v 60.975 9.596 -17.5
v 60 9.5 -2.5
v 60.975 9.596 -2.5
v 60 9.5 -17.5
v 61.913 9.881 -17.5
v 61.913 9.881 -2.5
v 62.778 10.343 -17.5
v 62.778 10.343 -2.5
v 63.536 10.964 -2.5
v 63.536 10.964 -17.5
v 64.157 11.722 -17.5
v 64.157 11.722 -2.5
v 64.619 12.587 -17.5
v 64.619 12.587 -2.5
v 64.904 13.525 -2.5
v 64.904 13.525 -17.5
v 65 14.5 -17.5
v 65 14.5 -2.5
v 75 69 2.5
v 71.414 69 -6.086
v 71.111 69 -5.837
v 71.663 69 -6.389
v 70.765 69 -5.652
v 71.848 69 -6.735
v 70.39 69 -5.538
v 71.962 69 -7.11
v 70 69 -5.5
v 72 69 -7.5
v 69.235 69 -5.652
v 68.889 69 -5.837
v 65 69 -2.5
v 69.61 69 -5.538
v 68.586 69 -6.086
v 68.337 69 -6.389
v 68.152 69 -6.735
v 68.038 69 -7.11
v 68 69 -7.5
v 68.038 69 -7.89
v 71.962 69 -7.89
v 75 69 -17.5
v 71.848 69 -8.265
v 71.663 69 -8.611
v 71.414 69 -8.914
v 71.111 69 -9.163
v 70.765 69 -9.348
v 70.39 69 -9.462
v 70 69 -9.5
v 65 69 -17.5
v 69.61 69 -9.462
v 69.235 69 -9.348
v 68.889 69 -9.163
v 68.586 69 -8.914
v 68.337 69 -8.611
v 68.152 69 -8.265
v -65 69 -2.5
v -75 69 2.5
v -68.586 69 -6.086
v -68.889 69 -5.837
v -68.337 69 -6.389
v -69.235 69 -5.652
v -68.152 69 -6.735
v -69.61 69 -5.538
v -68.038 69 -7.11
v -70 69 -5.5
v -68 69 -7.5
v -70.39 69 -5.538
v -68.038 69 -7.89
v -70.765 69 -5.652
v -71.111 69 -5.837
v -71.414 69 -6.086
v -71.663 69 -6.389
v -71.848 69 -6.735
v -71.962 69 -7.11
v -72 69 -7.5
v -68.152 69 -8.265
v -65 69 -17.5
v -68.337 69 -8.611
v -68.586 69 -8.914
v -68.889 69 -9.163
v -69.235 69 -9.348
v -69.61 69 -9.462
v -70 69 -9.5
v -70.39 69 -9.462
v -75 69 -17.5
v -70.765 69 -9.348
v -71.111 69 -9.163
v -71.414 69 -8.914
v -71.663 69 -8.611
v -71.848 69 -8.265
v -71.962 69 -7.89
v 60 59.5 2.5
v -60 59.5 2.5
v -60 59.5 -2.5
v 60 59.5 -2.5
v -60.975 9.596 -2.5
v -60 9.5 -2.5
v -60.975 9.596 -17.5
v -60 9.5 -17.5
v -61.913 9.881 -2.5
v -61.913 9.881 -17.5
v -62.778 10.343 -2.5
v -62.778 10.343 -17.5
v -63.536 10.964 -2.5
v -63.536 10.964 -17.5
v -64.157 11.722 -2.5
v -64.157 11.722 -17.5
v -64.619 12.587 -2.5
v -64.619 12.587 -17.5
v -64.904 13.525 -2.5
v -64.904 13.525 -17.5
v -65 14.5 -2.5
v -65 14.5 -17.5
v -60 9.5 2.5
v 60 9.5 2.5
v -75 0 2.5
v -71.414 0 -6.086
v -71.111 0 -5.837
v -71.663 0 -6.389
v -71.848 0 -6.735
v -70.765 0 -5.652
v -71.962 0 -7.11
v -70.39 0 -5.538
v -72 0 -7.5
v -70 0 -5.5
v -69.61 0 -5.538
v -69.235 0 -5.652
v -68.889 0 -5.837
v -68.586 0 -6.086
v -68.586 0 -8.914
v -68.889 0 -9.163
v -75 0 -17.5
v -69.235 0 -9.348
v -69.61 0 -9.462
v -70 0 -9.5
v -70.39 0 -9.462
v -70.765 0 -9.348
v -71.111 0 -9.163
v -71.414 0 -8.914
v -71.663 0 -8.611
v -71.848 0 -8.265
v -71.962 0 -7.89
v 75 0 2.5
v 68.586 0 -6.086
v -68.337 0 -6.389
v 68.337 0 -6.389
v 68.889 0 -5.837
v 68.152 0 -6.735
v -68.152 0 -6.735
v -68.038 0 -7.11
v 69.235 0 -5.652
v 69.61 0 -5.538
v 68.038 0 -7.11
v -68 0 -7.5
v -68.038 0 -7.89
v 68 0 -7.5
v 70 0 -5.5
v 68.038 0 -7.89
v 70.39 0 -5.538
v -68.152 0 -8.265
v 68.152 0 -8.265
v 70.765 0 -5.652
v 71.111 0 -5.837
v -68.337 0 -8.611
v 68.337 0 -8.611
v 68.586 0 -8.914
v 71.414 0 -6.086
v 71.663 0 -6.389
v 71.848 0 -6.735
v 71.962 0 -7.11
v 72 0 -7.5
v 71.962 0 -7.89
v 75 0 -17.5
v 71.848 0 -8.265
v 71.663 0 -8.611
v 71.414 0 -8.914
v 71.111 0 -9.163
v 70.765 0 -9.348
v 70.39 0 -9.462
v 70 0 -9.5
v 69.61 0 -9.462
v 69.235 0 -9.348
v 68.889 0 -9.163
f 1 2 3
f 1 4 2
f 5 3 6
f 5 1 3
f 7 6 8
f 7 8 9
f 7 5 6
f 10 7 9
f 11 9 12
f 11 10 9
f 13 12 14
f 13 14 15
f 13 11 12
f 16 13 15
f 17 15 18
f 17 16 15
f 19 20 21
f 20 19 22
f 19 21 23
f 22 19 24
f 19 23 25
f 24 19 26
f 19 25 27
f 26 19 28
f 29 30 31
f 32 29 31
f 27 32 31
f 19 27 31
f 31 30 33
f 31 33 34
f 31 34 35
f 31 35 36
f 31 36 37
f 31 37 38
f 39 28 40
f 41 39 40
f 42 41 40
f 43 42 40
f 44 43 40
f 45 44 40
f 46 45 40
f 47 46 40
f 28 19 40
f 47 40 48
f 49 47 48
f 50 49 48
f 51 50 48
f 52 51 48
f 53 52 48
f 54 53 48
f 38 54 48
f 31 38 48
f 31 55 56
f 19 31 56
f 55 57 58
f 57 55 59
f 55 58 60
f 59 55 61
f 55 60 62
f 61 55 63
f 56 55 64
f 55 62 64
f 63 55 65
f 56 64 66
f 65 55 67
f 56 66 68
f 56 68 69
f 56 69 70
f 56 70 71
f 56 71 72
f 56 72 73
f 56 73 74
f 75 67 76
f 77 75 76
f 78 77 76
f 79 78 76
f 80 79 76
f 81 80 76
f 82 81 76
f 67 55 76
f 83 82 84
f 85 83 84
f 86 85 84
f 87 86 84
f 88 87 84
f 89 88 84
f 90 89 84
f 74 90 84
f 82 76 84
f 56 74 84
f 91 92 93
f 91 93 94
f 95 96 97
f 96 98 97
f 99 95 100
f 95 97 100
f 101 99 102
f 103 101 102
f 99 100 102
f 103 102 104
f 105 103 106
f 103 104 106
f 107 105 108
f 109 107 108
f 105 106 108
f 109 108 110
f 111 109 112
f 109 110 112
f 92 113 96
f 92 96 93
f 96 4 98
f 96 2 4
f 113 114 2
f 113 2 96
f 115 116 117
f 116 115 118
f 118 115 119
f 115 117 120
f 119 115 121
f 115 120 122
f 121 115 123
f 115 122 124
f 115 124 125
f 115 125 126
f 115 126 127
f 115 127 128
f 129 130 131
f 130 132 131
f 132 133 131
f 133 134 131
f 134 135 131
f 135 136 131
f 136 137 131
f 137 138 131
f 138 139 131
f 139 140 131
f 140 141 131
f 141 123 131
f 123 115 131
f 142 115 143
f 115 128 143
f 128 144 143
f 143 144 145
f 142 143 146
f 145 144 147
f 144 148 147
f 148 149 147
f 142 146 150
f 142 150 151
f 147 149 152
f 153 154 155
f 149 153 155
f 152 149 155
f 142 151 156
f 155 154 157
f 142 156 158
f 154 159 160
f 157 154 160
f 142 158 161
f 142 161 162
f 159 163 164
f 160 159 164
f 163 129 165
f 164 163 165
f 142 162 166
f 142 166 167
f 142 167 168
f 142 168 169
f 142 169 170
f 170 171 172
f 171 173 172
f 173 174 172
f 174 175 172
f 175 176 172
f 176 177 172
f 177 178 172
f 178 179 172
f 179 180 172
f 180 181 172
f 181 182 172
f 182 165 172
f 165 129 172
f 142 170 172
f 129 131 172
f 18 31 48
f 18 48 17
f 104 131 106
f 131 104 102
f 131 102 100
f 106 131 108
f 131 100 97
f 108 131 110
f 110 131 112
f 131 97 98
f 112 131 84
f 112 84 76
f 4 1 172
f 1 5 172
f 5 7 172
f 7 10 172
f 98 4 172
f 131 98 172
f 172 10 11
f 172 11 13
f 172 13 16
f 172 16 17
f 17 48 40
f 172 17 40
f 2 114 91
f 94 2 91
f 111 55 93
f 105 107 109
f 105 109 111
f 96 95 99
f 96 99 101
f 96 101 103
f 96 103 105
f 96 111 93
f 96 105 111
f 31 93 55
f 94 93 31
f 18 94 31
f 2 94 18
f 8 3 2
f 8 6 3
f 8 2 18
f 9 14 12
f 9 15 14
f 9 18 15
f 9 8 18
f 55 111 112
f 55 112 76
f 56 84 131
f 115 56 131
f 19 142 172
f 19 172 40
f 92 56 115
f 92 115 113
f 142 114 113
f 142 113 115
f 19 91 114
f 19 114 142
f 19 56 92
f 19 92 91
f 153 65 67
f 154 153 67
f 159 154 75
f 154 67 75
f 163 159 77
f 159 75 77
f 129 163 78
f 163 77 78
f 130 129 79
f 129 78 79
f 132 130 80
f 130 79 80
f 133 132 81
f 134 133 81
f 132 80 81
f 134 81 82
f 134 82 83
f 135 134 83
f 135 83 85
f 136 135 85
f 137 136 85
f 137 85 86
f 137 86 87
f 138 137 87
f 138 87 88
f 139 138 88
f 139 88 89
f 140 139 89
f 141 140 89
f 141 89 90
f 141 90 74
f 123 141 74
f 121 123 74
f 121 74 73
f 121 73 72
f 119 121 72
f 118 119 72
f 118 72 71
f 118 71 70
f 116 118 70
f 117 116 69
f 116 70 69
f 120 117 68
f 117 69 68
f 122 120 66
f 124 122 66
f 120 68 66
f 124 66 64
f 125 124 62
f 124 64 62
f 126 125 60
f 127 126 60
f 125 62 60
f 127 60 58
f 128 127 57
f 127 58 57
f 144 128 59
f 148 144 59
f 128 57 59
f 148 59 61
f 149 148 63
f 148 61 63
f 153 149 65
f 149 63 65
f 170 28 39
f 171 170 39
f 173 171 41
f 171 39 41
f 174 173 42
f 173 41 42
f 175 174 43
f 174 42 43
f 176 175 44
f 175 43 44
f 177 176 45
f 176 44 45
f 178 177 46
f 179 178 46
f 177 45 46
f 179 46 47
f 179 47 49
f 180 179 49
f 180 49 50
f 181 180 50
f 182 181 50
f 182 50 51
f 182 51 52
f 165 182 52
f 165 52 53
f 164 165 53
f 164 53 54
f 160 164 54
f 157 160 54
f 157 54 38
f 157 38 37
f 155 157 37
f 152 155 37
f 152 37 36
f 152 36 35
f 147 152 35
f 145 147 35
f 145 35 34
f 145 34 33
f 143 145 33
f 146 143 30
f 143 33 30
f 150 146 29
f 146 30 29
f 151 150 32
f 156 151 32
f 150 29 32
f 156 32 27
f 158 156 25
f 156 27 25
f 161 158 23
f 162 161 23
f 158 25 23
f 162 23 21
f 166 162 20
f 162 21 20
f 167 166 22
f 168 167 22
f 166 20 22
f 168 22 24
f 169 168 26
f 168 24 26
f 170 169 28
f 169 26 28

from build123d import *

# Parameters (mm, degrees)
SKETCH1_W                = 130
SKETCH1_H                = 5
BOSS_EXTRUDE1_DEPTH      = 69
SKETCH2_W                = 120
SKETCH2_H                = 50
CUT_EXTRUDE1_DEPTH       = 65
BOSS_EXTRUDE3_DEPTH      = 15
BOSS_EXTRUDE3_DEPTH_BACK = 5
SKETCH4_R                = 2
CUT_EXTRUDE2_DEPTH       = 70
FILLET1_R                = 5


with BuildPart() as part:
    # Sketch1 → Boss-Extrude1 (new body)
    with BuildSketch(Plane(origin=(0, 0, 0), x_dir=(1, 0, 0), z_dir=(0, 1, 0))):
        Rectangle(SKETCH1_W, SKETCH1_H)
    extrude(amount=BOSS_EXTRUDE1_DEPTH)

    # Sketch2 → Cut-Extrude1 (cut)
    with BuildSketch(Plane.XY.offset(2.5)):
        with Locations((0, 34.5)):
            Rectangle(SKETCH2_W, SKETCH2_H)
    extrude(amount=-CUT_EXTRUDE1_DEPTH, mode=Mode.SUBTRACT)

    # Sketch3 → Boss-Extrude3 (add, two sides)
    with BuildSketch(Plane(origin=(0, 0, -2.5), x_dir=(-1, 0, 0), z_dir=(0, 0, -1))) as boss_extrude3_sk:
        Polygon((75, 0), (-75, 0), (-75, 69), (-65, 69), (-65, 9.5), (65, 9.5), (65, 69), (75, 69), align=None)
    extrude(amount=BOSS_EXTRUDE3_DEPTH)
    extrude(boss_extrude3_sk.sketch, amount=-BOSS_EXTRUDE3_DEPTH_BACK)

    # Sketch4 → Cut-Extrude2 (cut, through all)
    with BuildSketch(Plane(origin=(0, 69, 0), x_dir=(1, 0, 0), z_dir=(0, 1, 0))):
        with Locations((-70, 7.5)):
            Circle(SKETCH4_R)
        with Locations((70, 7.5)):
            Circle(SKETCH4_R)
    extrude(amount=-CUT_EXTRUDE2_DEPTH, mode=Mode.SUBTRACT)

    # Fillet1
    fillet1_edges = [part.edges().sort_by_distance(p)[0] for p in [
        (65, 9.5, -10),
        (-65, 9.5, -10),
    ]]
    fillet(fillet1_edges, radius=FILLET1_R)


solid = part.part
